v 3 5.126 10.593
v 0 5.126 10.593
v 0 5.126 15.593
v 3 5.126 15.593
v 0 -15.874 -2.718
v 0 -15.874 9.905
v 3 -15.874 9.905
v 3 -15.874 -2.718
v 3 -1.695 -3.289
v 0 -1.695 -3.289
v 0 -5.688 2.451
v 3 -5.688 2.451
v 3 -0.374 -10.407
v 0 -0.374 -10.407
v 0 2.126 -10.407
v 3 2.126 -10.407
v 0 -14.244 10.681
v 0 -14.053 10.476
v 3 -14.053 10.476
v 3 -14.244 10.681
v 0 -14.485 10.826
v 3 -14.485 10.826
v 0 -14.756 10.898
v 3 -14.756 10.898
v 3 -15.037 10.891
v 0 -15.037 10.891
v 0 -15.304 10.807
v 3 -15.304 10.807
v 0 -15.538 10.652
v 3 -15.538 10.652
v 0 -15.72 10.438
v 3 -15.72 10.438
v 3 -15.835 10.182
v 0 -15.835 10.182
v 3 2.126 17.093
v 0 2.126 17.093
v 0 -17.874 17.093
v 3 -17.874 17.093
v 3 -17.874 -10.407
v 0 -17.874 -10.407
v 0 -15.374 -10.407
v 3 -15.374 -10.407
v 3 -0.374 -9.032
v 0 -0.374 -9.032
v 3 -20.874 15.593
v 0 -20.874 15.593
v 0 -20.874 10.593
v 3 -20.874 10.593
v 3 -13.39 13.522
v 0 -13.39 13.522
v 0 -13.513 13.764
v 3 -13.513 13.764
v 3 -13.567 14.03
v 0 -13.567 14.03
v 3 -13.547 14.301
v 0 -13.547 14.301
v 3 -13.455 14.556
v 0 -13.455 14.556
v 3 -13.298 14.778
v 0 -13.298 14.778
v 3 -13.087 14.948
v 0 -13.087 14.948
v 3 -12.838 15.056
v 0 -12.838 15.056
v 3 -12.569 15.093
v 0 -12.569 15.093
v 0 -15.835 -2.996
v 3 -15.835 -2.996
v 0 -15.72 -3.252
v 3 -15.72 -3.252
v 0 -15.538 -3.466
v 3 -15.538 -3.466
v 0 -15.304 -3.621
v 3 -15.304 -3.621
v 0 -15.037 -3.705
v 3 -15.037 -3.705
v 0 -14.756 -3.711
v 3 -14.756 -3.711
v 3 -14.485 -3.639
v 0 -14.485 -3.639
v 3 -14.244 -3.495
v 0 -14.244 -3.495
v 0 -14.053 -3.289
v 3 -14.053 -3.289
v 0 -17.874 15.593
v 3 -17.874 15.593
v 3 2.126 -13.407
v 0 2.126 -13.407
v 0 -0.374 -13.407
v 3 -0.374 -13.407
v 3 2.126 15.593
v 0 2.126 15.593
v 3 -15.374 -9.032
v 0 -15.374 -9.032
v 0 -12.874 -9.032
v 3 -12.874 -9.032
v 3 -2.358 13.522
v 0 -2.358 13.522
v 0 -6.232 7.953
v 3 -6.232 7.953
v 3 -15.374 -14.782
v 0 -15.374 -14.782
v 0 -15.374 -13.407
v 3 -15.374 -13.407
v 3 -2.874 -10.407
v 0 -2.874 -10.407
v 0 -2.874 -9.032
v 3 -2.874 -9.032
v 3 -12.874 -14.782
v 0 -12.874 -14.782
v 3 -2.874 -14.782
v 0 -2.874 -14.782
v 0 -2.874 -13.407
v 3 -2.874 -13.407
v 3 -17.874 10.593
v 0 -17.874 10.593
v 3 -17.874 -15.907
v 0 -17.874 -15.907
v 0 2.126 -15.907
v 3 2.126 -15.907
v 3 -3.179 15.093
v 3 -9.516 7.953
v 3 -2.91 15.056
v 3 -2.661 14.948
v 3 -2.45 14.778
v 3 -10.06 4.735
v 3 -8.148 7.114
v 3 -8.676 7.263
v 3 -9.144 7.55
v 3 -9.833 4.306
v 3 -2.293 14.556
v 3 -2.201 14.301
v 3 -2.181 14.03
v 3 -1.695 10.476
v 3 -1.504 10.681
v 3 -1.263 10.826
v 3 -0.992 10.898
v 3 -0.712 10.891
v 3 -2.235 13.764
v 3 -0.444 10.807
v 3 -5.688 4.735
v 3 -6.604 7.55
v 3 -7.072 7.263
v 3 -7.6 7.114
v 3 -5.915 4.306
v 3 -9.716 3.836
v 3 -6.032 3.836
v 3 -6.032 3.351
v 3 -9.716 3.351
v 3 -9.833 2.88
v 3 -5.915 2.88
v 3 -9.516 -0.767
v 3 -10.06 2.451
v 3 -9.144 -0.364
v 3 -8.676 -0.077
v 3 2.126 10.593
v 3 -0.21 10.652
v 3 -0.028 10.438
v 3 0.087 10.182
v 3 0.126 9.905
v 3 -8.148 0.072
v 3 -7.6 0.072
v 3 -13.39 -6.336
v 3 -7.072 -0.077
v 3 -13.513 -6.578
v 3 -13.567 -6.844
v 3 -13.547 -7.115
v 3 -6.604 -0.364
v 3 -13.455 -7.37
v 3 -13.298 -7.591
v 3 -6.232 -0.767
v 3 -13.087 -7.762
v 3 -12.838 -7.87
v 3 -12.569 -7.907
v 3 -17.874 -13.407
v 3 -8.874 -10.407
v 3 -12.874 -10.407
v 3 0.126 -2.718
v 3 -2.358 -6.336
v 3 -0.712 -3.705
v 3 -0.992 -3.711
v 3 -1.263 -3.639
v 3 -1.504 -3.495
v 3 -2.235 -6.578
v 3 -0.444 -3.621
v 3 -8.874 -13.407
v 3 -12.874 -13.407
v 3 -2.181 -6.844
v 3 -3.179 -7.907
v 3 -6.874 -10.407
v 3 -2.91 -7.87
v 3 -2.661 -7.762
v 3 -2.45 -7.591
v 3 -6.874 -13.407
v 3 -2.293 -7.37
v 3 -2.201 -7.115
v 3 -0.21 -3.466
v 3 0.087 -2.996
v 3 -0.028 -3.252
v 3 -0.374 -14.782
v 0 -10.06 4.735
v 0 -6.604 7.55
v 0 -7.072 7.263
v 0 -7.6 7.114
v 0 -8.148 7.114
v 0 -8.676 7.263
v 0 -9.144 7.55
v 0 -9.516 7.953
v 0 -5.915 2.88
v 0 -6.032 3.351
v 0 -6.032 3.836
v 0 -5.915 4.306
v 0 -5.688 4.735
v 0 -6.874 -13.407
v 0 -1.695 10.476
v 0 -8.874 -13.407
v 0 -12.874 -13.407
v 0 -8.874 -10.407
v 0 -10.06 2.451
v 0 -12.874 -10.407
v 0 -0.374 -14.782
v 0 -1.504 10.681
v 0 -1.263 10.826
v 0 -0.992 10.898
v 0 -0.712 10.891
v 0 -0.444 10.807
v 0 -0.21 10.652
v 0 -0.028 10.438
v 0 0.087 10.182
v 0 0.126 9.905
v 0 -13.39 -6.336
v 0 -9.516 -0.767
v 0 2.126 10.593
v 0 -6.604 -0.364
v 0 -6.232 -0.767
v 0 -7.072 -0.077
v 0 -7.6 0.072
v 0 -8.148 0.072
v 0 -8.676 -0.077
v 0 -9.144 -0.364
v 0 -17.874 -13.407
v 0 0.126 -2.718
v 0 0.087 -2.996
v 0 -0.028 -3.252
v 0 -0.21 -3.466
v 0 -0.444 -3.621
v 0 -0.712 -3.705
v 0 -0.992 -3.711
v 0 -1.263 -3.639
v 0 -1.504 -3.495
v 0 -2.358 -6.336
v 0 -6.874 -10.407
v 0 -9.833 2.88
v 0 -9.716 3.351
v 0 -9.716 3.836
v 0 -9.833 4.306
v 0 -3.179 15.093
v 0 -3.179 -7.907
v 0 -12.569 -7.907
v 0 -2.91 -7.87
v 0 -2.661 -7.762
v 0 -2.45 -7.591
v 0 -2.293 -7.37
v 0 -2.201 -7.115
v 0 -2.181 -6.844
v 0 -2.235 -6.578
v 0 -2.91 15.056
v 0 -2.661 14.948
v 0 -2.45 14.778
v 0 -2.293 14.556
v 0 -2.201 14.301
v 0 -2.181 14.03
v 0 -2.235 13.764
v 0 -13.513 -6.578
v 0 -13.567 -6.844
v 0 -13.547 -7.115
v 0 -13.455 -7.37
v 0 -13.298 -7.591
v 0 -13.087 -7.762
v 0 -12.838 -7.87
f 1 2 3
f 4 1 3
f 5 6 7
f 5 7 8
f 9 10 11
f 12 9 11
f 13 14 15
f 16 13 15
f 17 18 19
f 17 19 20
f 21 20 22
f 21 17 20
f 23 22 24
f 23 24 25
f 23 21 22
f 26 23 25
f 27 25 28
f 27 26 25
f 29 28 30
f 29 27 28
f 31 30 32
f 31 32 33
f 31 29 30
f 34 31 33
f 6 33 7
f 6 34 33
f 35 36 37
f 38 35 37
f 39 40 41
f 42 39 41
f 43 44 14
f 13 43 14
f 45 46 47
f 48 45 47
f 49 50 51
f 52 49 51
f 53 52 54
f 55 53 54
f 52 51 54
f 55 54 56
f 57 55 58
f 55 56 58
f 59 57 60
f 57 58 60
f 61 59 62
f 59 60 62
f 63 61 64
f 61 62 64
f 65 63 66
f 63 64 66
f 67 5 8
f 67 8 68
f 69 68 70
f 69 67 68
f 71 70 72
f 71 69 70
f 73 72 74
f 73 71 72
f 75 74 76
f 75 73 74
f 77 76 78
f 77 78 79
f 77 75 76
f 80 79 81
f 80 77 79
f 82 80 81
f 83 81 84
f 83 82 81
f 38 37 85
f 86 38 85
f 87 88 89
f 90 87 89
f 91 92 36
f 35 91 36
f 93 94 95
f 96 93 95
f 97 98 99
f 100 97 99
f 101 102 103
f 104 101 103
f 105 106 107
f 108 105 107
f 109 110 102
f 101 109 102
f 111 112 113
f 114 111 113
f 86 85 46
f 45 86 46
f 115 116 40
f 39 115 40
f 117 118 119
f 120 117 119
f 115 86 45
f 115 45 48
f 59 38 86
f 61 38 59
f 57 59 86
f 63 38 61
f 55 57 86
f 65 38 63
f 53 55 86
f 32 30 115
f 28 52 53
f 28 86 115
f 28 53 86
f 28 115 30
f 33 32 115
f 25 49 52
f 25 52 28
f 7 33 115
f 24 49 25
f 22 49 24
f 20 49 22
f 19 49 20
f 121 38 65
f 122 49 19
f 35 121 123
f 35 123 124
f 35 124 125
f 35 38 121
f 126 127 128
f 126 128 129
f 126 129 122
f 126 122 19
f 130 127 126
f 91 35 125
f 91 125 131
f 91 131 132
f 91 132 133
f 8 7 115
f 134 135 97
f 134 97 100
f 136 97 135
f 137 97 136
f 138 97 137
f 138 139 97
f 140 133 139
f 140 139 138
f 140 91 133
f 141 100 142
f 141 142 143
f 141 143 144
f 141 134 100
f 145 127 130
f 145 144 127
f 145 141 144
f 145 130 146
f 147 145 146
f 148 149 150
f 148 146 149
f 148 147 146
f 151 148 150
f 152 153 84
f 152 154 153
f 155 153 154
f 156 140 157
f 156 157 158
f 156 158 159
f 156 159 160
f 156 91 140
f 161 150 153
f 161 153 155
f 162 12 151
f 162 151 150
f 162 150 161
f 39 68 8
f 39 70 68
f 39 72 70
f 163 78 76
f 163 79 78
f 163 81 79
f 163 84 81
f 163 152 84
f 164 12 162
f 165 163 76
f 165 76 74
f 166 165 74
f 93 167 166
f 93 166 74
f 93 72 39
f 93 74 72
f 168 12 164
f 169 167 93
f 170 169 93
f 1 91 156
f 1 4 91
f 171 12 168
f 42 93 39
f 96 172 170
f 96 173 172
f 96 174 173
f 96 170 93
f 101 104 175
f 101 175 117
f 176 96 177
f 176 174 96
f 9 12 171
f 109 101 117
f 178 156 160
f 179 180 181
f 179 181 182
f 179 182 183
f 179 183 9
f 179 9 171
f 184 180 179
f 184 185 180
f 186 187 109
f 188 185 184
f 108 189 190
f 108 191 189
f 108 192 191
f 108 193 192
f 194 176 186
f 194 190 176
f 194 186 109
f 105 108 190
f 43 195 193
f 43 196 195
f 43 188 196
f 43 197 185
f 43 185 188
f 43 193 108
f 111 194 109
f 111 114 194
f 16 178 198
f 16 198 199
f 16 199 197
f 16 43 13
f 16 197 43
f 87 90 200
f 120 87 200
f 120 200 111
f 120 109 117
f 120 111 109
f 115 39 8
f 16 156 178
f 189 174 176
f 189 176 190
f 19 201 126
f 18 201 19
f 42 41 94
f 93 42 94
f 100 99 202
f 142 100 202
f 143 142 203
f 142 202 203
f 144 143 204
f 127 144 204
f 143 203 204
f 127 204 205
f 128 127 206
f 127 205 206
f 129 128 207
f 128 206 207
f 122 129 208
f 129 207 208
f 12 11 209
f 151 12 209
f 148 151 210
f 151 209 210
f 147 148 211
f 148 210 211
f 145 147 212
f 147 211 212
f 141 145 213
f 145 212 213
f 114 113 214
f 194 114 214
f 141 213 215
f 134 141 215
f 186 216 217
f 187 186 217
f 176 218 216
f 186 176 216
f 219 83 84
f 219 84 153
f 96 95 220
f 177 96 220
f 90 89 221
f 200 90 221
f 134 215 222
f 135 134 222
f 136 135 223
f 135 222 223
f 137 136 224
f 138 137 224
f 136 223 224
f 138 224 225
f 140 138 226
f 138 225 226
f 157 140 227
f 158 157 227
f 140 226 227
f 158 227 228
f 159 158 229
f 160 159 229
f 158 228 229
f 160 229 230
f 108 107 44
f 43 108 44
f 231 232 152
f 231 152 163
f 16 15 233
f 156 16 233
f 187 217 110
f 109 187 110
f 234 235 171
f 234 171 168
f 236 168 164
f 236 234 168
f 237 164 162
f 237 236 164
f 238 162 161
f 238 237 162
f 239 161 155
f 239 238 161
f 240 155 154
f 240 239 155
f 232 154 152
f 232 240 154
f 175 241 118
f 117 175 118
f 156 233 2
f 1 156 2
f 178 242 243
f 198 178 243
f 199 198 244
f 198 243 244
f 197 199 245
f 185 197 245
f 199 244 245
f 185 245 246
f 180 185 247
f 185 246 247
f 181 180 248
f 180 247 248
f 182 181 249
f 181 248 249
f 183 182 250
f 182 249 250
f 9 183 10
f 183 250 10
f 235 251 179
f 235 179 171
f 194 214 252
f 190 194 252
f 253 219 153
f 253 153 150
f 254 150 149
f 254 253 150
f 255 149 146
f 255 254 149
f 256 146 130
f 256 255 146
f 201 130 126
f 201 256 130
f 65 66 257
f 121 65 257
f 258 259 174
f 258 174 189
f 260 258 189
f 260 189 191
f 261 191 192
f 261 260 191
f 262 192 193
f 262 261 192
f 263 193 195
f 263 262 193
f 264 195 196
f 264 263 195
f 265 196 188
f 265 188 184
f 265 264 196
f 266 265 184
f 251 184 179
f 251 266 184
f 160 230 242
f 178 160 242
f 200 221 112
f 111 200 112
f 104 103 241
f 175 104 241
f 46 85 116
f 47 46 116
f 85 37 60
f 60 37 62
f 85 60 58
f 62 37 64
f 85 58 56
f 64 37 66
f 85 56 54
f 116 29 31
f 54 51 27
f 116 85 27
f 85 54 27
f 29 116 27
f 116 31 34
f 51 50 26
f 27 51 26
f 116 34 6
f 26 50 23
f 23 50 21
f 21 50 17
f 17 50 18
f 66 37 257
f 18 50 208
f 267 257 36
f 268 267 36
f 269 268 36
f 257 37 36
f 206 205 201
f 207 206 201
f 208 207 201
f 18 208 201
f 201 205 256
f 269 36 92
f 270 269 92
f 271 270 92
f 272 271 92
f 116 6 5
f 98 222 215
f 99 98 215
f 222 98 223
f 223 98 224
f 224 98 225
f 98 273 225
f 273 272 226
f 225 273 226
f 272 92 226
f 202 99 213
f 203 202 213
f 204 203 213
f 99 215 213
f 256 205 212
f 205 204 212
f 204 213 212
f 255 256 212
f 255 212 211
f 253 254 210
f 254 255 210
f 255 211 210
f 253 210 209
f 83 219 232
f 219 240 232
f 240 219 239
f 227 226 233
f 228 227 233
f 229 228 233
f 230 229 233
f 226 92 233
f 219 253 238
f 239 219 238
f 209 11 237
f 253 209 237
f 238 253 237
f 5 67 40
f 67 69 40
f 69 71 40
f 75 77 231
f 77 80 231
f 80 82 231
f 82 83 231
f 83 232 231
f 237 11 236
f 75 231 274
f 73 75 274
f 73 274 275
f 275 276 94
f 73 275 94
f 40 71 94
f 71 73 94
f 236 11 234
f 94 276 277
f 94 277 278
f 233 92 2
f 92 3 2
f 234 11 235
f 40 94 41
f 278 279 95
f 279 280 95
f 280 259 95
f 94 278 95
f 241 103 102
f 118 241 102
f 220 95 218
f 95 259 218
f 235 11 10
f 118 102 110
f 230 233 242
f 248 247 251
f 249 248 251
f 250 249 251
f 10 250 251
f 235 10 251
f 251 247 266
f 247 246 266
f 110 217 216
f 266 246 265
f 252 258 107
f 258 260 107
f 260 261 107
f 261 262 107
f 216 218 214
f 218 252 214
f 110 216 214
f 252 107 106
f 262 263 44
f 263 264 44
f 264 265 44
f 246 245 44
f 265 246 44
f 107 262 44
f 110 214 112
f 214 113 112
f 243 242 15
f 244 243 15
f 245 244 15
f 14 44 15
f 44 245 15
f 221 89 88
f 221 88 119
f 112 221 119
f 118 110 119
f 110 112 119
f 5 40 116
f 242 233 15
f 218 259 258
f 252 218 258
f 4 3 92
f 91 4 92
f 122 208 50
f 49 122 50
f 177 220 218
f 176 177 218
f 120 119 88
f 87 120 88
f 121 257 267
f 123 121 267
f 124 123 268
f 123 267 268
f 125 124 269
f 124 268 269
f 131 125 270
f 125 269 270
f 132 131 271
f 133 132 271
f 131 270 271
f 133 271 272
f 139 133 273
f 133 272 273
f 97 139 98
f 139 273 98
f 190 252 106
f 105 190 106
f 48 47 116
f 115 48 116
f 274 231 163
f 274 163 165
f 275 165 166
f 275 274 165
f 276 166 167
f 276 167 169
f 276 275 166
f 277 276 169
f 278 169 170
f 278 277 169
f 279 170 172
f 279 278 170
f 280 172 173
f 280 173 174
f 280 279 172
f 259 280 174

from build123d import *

# Parameters (mm, degrees)
RESSALTO_EXTRUS_O1_DEPTH = 3


with BuildPart() as part:
    # Esboço1 → Ressalto-extrusão1 (new body)
    with BuildSketch(Plane(origin=(0, 0, 0), x_dir=(0, 0, -1), z_dir=(1, 0, 0))):
        Polygon((-15.593145924, 2.125903998), (-17.093145924, 2.125903998), (-17.093145924, -17.874096002), (-15.593145924, -17.874096002), (-15.593145924, -20.874096002), (-10.593145924, -20.874096002), (-10.593145924, -17.874096002), (-9.093145924, -17.874096002), (10.406854076, -17.874096002), (10.406854076, -15.374096002), (9.031854076, -15.374096002), (9.031854076, -12.874096002), (10.406854076, -12.874096002), (10.406854076, -10.374096002), (10.406854076, -8.874096002), (13.406854076, -8.874096002), (13.406854076, -10.374096002), (13.406854076, -12.874096002), (14.781854076, -12.874096002), (14.781854076, -15.374096002), (13.406854076, -15.374096002), (13.406854076, -17.874096002), (15.906854076, -17.874096002), (15.906854076, 2.125903998), (13.406854076, 2.125903998), (13.406854076, -0.374096002), (14.781854076, -0.374096002), (14.781854076, -2.874096002), (13.406854076, -2.874096002), (13.406854076, -5.374096002), (13.406854076, -6.874096002), (10.406854076, -6.874096002), (10.406854076, -5.374096002), (10.406854076, -3.256067355), (10.406854076, -2.874096002), (9.031854076, -2.874096002), (9.031854076, -0.374096002), (10.406854076, -0.374096002), (10.406854076, 2.125903998), (-9.093145924, 2.125903998), (-10.593145924, 2.125903998), (-10.593145924, 5.125903998), (-15.593145924, 5.125903998), align=None)
        with BuildLine():
            Line((-7.953248379, -9.515906406), (-13.522081436, -13.389877228))
            ThreePointArc((-13.522081436, -13.389877228), (-14.556252559, -13.455274595), (-15.093145924, -12.568972026))
            Line((-15.093145924, -12.568972026), (-15.093145924, -3.179219979))
            ThreePointArc((-15.093145924, -3.179219979), (-14.556252559, -2.292917409), (-13.522081436, -2.358314777))
            Line((-13.522081436, -2.358314777), (-7.953248379, -6.232285599))
            ThreePointArc((-7.953248379, -6.232285599), (-7.095377355, -7.874096002), (-7.953248379, -9.515906406))
        make_face(mode=Mode.SUBTRACT)
        with BuildLine():
            Line((-4.7352749, -10.059924856), (-10.475594696, -14.053190801))
            ThreePointArc((-10.475594696, -14.053190801), (-10.858706607, -15.173340717), (-9.904530208, -15.874096002))
            Line((-9.904530208, -15.874096002), (2.71823836, -15.874096002))
            ThreePointArc((2.71823836, -15.874096002), (3.67241476, -15.173340717), (3.289302849, -14.053190801))
            Line((3.289302849, -14.053190801), (-2.451016947, -10.059924856))
            ThreePointArc((-2.451016947, -10.059924856), (-3.593145924, -9.701735259), (-4.7352749, -10.059924856))
        make_face(mode=Mode.SUBTRACT)
        with BuildLine():
            Line((0.766956531, -9.515906406), (6.335789588, -13.389877228))
            ThreePointArc((6.335789588, -13.389877228), (7.369960712, -13.455274595), (7.906854076, -12.568972026))
            Line((7.906854076, -12.568972026), (7.906854076, -10.374096002))
            Line((7.906854076, -10.374096002), (7.906854076, -3.179219979))
            ThreePointArc((7.906854076, -3.179219979), (7.369960712, -2.292917409), (6.335789588, -2.358314777))
            Line((6.335789588, -2.358314777), (0.766956531, -6.232285599))
            ThreePointArc((0.766956531, -6.232285599), (-0.090914492, -7.874096002), (0.766956531, -9.515906406))
        make_face(mode=Mode.SUBTRACT)
        with BuildLine():
            Line((3.289302849, -1.695001204), (-2.451016947, -5.688267149))
            ThreePointArc((-2.451016947, -5.688267149), (-3.593145924, -6.046456746), (-4.7352749, -5.688267149))
            Line((-4.7352749, -5.688267149), (-10.475594696, -1.695001204))
            ThreePointArc((-10.475594696, -1.695001204), (-10.858706607, -0.574851288), (-9.904530208, 0.125903998))
            Line((-9.904530208, 0.125903998), (2.71823836, 0.125903998))
            ThreePointArc((2.71823836, 0.125903998), (3.67241476, -0.574851288), (3.289302849, -1.695001204))
        make_face(mode=Mode.SUBTRACT)
    extrude(amount=RESSALTO_EXTRUS_O1_DEPTH)


solid = part.part
